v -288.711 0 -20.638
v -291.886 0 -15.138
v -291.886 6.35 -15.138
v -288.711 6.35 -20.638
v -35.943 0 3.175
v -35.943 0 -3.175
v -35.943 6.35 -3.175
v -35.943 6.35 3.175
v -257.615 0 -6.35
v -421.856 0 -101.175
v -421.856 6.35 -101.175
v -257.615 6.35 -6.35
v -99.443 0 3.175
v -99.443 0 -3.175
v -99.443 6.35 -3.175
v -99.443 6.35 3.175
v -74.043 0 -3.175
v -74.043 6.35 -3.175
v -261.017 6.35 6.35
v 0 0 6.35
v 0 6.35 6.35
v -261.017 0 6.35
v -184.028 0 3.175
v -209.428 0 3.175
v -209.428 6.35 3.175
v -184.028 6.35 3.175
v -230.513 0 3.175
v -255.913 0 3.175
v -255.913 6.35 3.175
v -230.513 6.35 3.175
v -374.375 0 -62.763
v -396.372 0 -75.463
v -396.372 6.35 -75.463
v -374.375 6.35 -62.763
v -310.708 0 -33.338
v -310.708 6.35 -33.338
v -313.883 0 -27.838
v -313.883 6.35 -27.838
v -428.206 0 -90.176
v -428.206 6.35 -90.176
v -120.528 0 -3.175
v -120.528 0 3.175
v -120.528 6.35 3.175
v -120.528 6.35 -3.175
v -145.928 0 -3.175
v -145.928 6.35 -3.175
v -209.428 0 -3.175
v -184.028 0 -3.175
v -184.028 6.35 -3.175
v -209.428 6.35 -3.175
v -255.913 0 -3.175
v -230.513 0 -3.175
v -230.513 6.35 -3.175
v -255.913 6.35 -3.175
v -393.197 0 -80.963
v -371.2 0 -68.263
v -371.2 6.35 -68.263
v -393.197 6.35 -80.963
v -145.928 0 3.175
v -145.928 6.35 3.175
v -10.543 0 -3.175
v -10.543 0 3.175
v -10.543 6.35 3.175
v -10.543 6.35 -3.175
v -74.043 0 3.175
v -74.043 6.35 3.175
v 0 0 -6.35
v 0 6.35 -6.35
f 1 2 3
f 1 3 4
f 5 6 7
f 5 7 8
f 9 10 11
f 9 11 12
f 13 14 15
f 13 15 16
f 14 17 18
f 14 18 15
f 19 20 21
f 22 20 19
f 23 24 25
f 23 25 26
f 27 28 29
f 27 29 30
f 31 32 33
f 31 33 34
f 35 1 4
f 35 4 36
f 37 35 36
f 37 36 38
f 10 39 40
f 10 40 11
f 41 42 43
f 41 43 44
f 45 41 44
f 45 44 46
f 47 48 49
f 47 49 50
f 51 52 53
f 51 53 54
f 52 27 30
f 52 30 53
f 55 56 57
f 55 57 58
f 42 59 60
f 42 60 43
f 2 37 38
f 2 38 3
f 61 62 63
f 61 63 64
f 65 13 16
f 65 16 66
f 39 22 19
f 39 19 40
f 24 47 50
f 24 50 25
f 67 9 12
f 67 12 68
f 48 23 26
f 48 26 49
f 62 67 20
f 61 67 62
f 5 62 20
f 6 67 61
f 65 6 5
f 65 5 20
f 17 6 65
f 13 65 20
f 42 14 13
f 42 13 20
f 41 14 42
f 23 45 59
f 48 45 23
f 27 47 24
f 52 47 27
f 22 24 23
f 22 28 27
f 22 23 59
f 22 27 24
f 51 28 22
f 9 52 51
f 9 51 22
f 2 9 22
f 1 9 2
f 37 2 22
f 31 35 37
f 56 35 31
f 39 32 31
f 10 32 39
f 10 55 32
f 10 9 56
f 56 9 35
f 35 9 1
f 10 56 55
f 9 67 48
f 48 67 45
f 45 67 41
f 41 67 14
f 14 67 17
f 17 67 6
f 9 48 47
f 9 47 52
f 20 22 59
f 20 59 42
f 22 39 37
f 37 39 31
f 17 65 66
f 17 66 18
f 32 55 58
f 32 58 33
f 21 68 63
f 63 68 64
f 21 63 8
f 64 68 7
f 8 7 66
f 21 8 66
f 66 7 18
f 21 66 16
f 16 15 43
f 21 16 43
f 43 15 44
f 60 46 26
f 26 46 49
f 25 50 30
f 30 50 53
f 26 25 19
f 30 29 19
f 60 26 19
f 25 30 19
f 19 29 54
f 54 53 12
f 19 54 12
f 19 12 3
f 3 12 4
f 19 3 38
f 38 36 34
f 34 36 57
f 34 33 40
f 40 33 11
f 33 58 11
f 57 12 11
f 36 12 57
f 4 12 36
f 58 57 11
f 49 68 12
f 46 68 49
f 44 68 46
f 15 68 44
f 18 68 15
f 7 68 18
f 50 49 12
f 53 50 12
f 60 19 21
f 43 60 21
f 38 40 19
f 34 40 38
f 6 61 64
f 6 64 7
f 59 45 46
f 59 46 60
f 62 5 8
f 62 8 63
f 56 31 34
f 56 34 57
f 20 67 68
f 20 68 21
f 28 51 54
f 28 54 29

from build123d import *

# Parameters (mm, degrees)
BOSS_EXTRUDE2_DEPTH = 6.35


with BuildPart() as part:
    # Sketch4 → Boss-Extrude2 (new body)
    with BuildSketch(Plane(origin=(0, 0, 0), x_dir=(1, 0, 0), z_dir=(0, 1, 0))):
        Polygon((-428.205616447, 90.176116322), (-421.855616447, 101.17463895), (-257.614523887, 6.349999946), (-1e-09, 6.35), (1e-09, -6.35), (-261.017478725, -6.35), align=None)
        Polygon((-396.37217922, 75.463246979), (-374.375133964, 62.763246979), (-371.200133964, 68.262508293), (-393.19717922, 80.962508293), align=None, mode=Mode.SUBTRACT)
        Polygon((-313.88325951, 27.838246978), (-291.886214254, 15.138246977), (-288.711214254, 20.637508291), (-310.70825951, 33.337508292), align=None, mode=Mode.SUBTRACT)
        Polygon((-255.913065771, 3.174999946), (-255.913065769, -3.175000054), (-230.513065769, -3.175000048), (-230.513065771, 3.174999952), align=None, mode=Mode.SUBTRACT)
        Polygon((-209.427839463, 3.174999956), (-209.427839461, -3.175000044), (-184.027839461, -3.175000038), (-184.027839463, 3.174999962), align=None, mode=Mode.SUBTRACT)
        Polygon((-120.527839461, -3.175000025), (-120.527839463, 3.174999975), (-145.927839463, 3.174999969), (-145.927839461, -3.175000031), align=None, mode=Mode.SUBTRACT)
        Polygon((-99.442613155, 3.174999979), (-99.442613153, -3.175000021), (-74.042613153, -3.175000015), (-74.042613155, 3.174999985), align=None, mode=Mode.SUBTRACT)
        Polygon((-10.542613153, -3.175000002), (-10.542613155, 3.174999998), (-35.942613155, 3.174999993), (-35.942613153, -3.175000007), align=None, mode=Mode.SUBTRACT)
    extrude(amount=BOSS_EXTRUDE2_DEPTH)


solid = part.part
